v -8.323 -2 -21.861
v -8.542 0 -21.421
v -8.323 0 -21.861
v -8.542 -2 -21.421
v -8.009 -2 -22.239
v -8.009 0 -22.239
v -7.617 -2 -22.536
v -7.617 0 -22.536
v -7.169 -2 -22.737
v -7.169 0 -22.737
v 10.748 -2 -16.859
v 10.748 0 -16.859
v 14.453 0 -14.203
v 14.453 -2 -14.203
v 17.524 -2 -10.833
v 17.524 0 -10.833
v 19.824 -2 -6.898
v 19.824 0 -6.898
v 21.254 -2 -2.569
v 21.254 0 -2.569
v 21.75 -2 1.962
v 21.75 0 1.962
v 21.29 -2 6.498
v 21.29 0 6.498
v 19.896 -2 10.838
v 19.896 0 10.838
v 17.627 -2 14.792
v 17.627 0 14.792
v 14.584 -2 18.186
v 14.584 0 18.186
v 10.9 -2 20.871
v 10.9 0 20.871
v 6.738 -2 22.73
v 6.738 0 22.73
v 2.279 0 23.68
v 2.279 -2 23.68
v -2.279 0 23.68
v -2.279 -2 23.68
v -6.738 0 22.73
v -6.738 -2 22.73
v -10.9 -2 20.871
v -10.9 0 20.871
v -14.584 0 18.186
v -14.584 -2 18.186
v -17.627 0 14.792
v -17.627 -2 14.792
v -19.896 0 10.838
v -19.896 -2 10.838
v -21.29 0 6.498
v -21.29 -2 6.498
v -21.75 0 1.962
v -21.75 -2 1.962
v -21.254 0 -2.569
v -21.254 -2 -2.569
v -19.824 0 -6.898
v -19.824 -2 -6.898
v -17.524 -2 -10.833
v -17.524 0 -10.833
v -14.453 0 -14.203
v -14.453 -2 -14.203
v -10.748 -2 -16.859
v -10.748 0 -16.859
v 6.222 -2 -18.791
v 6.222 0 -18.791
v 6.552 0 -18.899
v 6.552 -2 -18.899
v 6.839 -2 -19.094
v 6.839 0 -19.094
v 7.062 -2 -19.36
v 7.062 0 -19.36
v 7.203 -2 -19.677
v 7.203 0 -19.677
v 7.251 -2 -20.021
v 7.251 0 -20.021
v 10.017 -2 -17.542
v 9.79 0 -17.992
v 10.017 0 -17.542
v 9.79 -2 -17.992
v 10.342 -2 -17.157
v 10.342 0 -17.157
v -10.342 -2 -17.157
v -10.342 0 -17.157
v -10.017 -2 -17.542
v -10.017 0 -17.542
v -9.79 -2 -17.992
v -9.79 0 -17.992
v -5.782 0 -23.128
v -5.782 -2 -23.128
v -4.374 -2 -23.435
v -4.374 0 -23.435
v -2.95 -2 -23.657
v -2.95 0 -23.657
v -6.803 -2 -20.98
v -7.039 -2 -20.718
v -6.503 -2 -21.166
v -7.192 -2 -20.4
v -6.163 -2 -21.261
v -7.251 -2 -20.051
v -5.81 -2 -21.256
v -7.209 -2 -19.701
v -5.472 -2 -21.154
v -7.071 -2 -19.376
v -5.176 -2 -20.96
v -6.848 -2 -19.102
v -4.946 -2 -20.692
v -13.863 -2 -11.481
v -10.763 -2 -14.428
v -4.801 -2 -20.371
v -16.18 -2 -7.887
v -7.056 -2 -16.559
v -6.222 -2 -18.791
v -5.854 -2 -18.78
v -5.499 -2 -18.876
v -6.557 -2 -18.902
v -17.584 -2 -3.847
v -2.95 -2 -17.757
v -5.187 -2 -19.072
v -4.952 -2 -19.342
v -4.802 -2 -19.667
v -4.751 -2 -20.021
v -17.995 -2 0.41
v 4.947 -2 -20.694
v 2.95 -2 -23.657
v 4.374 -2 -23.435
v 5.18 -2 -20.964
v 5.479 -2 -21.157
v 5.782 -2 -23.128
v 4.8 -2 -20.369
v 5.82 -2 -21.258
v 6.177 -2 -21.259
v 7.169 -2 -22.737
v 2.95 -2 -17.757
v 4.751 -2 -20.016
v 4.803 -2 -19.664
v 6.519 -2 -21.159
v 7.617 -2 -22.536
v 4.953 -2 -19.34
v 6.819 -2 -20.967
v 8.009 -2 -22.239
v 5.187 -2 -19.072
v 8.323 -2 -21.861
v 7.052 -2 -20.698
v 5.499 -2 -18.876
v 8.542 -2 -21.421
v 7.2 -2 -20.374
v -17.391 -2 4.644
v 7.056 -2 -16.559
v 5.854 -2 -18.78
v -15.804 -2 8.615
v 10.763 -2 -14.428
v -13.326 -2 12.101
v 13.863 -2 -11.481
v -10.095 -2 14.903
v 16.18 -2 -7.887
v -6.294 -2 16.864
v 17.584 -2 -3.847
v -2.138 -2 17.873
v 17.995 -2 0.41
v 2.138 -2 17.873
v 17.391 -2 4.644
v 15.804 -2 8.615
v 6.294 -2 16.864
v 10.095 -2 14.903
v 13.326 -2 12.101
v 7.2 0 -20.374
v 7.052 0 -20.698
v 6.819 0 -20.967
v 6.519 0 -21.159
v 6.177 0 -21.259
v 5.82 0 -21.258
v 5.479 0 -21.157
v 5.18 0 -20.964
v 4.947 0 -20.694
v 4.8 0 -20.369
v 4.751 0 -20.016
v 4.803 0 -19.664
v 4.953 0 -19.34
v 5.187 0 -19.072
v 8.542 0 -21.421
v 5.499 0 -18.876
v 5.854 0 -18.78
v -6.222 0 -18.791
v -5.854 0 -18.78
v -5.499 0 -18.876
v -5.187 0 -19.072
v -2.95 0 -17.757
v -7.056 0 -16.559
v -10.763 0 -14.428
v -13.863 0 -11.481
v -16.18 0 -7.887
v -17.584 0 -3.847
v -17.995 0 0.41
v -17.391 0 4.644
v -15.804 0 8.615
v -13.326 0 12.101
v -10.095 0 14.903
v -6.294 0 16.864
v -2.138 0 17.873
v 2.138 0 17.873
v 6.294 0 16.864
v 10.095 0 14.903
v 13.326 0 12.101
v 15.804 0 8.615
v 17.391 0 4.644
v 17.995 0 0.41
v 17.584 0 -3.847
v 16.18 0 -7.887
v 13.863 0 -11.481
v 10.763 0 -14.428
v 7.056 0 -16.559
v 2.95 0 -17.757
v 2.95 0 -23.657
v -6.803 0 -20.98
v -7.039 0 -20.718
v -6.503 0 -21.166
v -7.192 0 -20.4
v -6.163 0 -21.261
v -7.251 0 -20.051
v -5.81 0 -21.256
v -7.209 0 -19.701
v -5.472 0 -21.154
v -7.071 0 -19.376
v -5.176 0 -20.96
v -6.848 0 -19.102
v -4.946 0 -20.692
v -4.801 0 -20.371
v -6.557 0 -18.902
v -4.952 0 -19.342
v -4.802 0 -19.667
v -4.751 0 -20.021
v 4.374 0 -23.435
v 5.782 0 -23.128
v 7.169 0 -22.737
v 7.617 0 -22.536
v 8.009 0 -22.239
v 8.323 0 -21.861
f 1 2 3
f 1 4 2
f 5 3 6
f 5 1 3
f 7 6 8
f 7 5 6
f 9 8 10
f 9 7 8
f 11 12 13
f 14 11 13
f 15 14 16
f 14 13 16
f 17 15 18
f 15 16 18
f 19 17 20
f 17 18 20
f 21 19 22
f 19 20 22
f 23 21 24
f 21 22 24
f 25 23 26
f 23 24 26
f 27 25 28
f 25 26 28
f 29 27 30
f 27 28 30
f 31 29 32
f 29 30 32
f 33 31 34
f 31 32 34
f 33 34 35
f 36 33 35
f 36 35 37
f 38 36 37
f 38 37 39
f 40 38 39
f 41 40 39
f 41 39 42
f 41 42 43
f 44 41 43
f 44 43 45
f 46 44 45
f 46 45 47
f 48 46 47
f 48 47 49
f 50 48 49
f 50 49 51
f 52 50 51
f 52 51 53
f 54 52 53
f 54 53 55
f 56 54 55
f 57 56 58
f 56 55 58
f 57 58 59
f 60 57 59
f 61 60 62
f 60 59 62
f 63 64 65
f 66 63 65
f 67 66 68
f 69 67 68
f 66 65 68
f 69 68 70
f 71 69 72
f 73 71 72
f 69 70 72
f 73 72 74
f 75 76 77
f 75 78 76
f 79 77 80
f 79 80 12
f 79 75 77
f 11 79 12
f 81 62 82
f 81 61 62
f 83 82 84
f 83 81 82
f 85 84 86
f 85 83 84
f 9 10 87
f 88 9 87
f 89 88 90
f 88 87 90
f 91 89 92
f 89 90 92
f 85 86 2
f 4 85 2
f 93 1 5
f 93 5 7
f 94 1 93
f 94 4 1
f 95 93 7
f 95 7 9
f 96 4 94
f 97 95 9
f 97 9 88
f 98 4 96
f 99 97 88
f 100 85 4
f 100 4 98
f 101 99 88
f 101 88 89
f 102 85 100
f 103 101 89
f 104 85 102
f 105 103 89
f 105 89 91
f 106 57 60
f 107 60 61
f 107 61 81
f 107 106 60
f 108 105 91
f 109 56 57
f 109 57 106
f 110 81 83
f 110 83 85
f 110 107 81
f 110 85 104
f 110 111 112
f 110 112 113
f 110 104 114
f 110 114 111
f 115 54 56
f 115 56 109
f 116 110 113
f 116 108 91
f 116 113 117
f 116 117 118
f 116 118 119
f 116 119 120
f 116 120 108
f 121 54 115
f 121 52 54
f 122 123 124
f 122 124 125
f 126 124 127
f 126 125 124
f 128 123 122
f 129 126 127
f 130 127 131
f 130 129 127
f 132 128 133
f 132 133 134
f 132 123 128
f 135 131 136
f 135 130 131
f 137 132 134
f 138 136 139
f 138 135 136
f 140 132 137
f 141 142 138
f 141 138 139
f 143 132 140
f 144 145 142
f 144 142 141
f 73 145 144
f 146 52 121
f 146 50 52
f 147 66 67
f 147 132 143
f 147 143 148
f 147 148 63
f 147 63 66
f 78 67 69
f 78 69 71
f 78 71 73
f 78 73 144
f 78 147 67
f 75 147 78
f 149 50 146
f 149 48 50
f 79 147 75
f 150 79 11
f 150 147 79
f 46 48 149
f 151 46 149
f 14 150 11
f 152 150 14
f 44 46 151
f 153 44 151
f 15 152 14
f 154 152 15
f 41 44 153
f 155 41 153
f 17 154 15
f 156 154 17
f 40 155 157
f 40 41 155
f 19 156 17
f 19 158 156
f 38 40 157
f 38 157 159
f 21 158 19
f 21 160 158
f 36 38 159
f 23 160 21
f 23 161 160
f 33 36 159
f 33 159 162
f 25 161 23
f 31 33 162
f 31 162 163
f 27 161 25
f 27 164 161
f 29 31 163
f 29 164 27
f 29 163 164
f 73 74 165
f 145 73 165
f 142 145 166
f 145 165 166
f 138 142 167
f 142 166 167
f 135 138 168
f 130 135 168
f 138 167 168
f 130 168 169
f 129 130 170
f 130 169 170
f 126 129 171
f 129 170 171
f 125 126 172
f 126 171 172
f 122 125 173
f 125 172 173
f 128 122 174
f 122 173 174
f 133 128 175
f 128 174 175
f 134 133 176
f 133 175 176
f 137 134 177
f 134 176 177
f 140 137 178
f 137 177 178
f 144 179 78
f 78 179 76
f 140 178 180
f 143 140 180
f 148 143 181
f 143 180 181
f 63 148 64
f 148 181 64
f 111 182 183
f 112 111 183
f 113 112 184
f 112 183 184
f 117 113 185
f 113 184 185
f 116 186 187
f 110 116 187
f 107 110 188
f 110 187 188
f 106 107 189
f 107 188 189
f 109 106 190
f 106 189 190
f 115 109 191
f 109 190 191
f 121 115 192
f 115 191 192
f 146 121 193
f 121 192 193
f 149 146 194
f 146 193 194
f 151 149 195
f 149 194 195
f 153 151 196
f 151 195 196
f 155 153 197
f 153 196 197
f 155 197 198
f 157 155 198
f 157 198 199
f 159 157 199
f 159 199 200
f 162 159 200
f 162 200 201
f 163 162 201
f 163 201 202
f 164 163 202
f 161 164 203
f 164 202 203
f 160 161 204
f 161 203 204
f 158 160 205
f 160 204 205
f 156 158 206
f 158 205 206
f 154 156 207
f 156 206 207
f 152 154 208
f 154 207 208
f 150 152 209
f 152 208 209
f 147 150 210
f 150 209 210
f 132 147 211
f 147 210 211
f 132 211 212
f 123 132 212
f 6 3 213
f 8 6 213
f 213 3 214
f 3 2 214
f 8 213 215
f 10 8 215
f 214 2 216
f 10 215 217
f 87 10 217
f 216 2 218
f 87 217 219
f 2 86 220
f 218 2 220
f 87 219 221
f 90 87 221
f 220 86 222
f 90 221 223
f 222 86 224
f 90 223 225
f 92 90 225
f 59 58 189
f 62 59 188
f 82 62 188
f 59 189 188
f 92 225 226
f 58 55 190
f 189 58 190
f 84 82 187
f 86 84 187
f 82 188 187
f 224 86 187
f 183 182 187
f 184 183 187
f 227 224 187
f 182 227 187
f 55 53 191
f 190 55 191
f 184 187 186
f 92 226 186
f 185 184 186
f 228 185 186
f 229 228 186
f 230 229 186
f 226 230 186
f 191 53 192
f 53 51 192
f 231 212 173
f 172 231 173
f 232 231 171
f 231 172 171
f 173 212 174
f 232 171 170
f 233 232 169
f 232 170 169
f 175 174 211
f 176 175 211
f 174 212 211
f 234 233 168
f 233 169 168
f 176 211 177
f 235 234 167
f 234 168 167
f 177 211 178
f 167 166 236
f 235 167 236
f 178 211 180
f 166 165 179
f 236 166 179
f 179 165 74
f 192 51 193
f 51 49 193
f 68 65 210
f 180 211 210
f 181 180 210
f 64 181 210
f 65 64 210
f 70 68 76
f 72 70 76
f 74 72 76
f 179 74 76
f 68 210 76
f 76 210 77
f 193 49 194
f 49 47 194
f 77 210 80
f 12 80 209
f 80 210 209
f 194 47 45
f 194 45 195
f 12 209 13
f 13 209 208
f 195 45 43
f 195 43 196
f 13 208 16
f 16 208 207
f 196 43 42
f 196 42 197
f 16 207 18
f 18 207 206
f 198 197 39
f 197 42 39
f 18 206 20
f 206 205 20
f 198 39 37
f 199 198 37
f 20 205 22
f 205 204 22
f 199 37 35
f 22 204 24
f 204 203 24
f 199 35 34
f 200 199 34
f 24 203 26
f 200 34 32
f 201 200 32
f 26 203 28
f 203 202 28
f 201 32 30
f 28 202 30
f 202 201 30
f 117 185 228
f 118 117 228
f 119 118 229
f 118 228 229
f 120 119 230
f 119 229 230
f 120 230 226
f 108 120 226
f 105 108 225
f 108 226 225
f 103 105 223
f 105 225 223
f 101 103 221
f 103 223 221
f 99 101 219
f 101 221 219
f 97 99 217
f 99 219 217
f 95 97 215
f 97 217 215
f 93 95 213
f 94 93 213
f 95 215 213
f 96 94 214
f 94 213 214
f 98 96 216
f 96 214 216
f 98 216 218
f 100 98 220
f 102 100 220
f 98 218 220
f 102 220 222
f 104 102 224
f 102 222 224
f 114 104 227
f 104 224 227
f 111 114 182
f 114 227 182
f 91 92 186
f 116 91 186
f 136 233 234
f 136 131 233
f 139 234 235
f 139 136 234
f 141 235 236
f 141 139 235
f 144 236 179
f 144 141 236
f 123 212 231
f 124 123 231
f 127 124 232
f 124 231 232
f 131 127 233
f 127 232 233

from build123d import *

# Parameters (mm, degrees)
F1_DEPTH = 2
F2_R     = 2.15


# Not quite as in the source:
# - a feature names something its author has since deleted; it is built from what else it names


with BuildPart() as f1:
    # F0 (on Front) → F1 (new body)
    with BuildSketch(Plane.XZ):
        with BuildLine():
            ThreePointArc((-2.95, -17.7566184844), (0, 18), (2.95, -17.7566184844))
            Line((2.95, -17.7566184844), (2.95, -19.4990138986))
            ThreePointArc((2.95, -19.4990138986), (4.0741879212, -19.3150062668), (5.1871999415, -19.0723923069))
            ThreePointArc((5.1871999415, -19.0723923069), (5.6730323101, -18.8149936793), (6.2223129211, -18.7909529991))
            ThreePointArc((6.2223129211, -18.7909529991), (8.1825487808, -18.102131288), (10.0681136131, -17.2294084005))
            ThreePointArc((10.0681136131, -17.2294084005), (0, 23.8), (-10.0681136131, -17.2294084005))
            ThreePointArc((-10.0681136131, -17.2294084005), (-8.1825487808, -18.102131288), (-6.2223129211, -18.7909529991))
            ThreePointArc((-6.2223129211, -18.7909529991), (-5.6730323101, -18.8149936793), (-5.1871999415, -19.0723923069))
            ThreePointArc((-5.1871999415, -19.0723923069), (-4.0741879212, -19.3150062668), (-2.95, -19.4990138986))
            Line((-2.95, -19.4990138986), (-2.95, -17.7566184844))
        make_face()
        with BuildLine():
            ThreePointArc((5.1871999415, -19.0723923069), (4.0741879212, -19.3150062668), (2.95, -19.4990138986))
            Line((2.95, -19.4990138986), (2.95, -23.6566184844))
            ThreePointArc((2.95, -23.6566184844), (5.6060820605, -23.1713172273), (8.1902527715, -22.3887886599))
            Line((8.1902527715, -22.3887886599), (10.0681136131, -17.2294084005))
            ThreePointArc((10.0681136131, -17.2294084005), (8.1825487808, -18.102131288), (6.2223129211, -18.7909529991))
            ThreePointArc((6.2223129211, -18.7909529991), (6.9599367667, -19.2193782076), (7.2509916054, -20.0212037359))
            ThreePointArc((7.2509916054, -20.0212037359), (5.4788515763, -21.1569280818), (5.1871999415, -19.0723923069))
        make_face()
        with BuildLine():
            Line((-2.95, -23.6566184844), (-2.95, -19.4990138986))
            ThreePointArc((-2.95, -19.4990138986), (-4.0741879212, -19.3150062668), (-5.1871999415, -19.0723923069))
            ThreePointArc((-5.1871999415, -19.0723923069), (-4.8652672595, -19.4990637067), (-4.7509916054, -20.0212037359))
            ThreePointArc((-4.7509916054, -20.0212037359), (-6.8028171337, -20.9801488971), (-6.2223129211, -18.7909529991))
            ThreePointArc((-6.2223129211, -18.7909529991), (-8.1825487808, -18.102131288), (-10.0681136131, -17.2294084005))
            Line((-10.0681136131, -17.2294084005), (-8.1902527715, -22.3887886599))
            ThreePointArc((-8.1902527715, -22.3887886599), (-5.6060820605, -23.1713172273), (-2.95, -23.6566184844))
        make_face()
    extrude(amount=F1_DEPTH)

    # F2
    f2_edges = [f1.edges().sort_by_distance(p)[0] for p in [
        (-10.068114, -1, -17.229408),
        (-8.190253, -1, -22.388789),
        (8.190253, -1, -22.388789),
        (10.068114, -1, -17.229408),
    ]]
    fillet(f2_edges, radius=F2_R)


solid = f1.part
